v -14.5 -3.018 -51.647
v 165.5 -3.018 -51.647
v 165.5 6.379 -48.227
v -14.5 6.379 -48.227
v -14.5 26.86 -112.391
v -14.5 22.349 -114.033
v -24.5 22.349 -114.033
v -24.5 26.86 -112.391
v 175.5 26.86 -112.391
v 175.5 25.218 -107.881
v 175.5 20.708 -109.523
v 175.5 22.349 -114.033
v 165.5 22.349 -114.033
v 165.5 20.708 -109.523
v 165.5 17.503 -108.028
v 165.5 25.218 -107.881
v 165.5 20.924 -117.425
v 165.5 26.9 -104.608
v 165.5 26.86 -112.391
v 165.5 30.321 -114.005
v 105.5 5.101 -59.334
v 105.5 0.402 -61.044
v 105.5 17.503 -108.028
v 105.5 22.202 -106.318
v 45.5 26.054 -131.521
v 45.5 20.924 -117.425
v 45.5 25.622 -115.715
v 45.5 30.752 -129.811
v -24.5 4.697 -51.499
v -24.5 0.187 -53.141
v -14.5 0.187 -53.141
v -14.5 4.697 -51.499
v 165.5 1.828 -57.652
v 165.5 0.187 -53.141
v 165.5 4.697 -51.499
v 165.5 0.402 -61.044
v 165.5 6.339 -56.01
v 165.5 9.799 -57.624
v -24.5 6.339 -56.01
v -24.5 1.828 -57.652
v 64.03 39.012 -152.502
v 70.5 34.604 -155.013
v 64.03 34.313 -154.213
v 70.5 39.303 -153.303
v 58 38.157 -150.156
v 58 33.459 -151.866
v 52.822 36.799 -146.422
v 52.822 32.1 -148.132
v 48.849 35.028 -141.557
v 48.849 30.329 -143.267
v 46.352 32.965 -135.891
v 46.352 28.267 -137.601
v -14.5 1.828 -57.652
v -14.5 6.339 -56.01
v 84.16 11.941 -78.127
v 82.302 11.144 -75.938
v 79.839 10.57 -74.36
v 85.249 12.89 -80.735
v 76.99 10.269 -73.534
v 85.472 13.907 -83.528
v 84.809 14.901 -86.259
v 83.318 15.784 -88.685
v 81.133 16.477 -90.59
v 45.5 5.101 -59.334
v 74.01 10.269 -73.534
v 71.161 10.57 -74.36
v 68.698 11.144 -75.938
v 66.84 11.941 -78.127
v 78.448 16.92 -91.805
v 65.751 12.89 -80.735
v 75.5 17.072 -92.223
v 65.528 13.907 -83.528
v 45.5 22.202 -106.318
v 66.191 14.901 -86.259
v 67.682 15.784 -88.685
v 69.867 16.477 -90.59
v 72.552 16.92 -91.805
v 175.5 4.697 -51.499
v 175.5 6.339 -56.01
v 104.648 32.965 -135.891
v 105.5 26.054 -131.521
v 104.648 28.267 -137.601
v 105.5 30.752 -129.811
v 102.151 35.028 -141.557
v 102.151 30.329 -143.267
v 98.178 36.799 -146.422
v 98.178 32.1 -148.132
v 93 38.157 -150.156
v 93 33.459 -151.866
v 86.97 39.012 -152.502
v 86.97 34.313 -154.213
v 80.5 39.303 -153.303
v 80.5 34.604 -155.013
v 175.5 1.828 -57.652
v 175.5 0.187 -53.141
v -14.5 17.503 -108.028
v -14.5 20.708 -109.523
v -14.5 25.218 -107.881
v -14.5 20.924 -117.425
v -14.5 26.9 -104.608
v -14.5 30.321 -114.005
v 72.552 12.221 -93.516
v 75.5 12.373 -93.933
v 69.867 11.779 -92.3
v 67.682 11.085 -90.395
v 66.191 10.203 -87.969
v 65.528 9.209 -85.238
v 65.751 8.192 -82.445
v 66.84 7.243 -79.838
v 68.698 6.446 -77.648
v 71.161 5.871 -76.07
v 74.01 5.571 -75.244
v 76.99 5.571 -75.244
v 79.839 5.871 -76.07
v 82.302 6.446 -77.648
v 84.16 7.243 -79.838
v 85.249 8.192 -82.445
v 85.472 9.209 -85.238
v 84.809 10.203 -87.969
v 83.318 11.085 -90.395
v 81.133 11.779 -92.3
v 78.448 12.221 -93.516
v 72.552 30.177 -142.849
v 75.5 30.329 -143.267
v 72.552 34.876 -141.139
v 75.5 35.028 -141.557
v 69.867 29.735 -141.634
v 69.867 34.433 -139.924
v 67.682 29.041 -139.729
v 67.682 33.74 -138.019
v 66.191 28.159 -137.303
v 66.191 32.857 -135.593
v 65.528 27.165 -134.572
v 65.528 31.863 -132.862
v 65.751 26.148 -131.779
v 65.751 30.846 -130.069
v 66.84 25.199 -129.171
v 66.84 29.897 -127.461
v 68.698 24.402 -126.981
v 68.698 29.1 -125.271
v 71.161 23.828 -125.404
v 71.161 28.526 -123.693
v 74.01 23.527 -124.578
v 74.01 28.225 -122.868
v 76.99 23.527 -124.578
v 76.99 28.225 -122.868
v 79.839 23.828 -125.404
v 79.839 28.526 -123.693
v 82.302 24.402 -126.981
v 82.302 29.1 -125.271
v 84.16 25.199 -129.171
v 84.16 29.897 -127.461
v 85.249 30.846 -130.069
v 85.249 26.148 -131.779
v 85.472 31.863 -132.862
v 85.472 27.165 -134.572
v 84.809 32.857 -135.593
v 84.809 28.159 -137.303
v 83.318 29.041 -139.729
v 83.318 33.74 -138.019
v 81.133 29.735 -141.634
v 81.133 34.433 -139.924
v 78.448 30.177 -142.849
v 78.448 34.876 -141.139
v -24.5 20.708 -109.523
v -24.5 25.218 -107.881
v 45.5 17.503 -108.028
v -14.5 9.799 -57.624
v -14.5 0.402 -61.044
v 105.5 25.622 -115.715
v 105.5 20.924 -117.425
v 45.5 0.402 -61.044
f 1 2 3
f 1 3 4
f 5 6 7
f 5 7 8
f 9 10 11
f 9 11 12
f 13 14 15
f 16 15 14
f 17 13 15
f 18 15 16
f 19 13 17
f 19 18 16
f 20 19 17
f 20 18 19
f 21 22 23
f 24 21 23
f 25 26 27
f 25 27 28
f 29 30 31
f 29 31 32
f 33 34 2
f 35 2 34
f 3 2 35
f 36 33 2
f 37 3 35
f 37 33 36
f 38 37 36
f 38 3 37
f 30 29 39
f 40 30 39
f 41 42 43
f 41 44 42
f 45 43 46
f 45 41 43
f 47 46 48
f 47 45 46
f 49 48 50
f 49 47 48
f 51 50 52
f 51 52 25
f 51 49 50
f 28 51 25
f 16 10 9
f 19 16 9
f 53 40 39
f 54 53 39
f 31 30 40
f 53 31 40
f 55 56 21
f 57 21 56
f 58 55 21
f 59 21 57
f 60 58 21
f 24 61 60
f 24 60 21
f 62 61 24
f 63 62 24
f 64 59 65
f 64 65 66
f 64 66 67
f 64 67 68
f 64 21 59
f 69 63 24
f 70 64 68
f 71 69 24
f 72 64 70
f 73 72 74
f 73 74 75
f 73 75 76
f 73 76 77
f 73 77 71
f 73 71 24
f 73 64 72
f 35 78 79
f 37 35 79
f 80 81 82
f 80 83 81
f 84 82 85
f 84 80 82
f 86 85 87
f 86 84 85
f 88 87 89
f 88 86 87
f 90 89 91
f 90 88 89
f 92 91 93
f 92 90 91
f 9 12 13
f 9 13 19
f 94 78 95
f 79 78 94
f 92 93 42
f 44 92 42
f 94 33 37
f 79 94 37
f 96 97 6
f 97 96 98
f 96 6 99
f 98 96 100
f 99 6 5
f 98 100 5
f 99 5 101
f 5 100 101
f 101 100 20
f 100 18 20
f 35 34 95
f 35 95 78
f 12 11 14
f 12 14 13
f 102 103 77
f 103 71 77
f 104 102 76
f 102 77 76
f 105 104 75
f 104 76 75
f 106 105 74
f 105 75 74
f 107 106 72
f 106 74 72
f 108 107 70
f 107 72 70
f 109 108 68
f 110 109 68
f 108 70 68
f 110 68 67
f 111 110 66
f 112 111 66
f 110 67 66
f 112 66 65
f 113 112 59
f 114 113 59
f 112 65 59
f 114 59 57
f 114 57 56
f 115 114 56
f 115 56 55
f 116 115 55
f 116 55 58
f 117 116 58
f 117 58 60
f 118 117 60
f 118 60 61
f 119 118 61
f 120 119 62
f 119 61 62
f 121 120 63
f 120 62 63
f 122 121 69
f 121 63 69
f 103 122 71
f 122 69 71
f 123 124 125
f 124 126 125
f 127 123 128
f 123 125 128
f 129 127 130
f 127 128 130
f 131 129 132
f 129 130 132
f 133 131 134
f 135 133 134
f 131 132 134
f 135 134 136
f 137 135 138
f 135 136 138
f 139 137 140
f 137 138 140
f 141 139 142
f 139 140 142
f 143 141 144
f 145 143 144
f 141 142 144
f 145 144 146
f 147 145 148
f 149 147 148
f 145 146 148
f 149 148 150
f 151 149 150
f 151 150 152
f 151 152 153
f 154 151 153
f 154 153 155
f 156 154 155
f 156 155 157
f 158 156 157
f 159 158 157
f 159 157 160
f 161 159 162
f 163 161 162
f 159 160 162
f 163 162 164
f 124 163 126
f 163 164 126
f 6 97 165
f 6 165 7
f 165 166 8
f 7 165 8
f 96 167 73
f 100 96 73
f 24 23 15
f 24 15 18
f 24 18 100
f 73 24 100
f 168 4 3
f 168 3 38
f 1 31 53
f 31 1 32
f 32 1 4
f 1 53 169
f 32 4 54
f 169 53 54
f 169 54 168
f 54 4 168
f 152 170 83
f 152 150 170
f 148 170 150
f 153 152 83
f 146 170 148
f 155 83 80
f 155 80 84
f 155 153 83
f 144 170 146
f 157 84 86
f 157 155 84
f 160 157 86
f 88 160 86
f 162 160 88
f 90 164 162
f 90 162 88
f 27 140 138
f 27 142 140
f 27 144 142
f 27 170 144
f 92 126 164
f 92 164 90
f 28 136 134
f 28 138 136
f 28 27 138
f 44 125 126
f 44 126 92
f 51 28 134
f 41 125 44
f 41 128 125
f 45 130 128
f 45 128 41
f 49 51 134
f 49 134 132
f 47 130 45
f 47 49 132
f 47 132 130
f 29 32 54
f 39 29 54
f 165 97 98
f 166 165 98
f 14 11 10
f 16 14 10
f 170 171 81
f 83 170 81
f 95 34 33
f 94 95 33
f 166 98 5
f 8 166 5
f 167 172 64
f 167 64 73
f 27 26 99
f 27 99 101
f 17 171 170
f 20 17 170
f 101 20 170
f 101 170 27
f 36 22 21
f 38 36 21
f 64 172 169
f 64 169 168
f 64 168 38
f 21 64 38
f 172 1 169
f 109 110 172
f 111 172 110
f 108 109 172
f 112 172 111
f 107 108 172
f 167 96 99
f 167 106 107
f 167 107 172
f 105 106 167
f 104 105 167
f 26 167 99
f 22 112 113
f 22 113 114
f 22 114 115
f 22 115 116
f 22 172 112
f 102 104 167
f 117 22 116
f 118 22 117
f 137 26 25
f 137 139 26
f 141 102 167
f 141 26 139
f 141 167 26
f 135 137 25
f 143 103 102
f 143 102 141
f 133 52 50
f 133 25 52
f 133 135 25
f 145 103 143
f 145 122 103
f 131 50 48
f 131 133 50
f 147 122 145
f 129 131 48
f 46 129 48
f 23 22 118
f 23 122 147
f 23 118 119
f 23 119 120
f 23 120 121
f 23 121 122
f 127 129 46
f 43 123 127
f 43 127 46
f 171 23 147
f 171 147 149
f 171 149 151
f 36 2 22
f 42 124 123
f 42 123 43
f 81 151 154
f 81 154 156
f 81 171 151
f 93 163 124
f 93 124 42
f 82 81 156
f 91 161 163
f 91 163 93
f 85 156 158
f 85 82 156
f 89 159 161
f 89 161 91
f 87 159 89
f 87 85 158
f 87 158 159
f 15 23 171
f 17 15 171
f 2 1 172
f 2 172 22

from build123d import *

# Parameters (mm, degrees)
SKETCH039_W             = 110
SKETCH039_H             = 60
PAD024_DEPTH            = 5
SKETCH040_W             = 10
SKETCH040_H             = 10
PAD025_DEPTH            = 90
SKETCH041_W             = 4.8
SKETCH041_H             = 4.8
PAD026_DEPTH            = 100
SKETCH042_R             = 10
POCKET015_DEPTH         = 3.5
FILLET002_R             = 25
BODY013_PITCH_ANGLE     = 70
BODY013_PLACEMENT_ANGLE = 90


with BuildPart() as part:
    # Sketch039 → Pad024 (new body)
    with BuildSketch(Plane.XY.offset(-2.5)):
        with Locations((52.5, 0)):
            Rectangle(SKETCH039_W, SKETCH039_H)
    extrude(amount=PAD024_DEPTH)

    # Sketch040 → Pad025 (join, symmetric)
    with BuildSketch(Plane.XZ):
        with Locations((2.5, 2.5)):
            Rectangle(SKETCH040_W, SKETCH040_H)
        with Locations((62.5, 2.5)):
            Rectangle(SKETCH040_W, SKETCH040_H)
    extrude(amount=PAD025_DEPTH, both=True)

    # Sketch041 → Pad026 (join, symmetric)
    with BuildSketch(Plane.XZ):
        with Locations((2.4, 2.4)):
            Rectangle(SKETCH041_W, SKETCH041_H)
        with Locations((62.4, 2.4)):
            Rectangle(SKETCH041_W, SKETCH041_H)
    extrude(amount=PAD026_DEPTH, both=True)

    # Sketch042 → Pocket015 (cut, symmetric)
    with BuildSketch(Plane.XY):
        with Locations((32.5, 0)):
            Circle(SKETCH042_R)
        with Locations((85, 0)):
            Circle(SKETCH042_R)
    extrude(amount=POCKET015_DEPTH, both=True, mode=Mode.SUBTRACT)

    # Fillet002
    fillet002_edges = [part.edges().sort_by_distance(p)[0] for p in [
        (107.5, 30, 0),
        (107.5, -30, 0),
    ]]
    fillet(fillet002_edges, radius=FILLET002_R)


with BuildPart() as part_1:
    # Body013 pitch: moved
    add(part.part.rotate(Axis((0, 0, 0), (0, 1, 0)), BODY013_PITCH_ANGLE))


with BuildPart() as part_2:
    # Body013 placement: moved
    add(part_1.part.moved(Location((75.5, 0.18654, -53.140994))).rotate(Axis((75.5, 0.18654, -53.140994), (0, 0, 1)), BODY013_PLACEMENT_ANGLE))


solid = part_2.part
